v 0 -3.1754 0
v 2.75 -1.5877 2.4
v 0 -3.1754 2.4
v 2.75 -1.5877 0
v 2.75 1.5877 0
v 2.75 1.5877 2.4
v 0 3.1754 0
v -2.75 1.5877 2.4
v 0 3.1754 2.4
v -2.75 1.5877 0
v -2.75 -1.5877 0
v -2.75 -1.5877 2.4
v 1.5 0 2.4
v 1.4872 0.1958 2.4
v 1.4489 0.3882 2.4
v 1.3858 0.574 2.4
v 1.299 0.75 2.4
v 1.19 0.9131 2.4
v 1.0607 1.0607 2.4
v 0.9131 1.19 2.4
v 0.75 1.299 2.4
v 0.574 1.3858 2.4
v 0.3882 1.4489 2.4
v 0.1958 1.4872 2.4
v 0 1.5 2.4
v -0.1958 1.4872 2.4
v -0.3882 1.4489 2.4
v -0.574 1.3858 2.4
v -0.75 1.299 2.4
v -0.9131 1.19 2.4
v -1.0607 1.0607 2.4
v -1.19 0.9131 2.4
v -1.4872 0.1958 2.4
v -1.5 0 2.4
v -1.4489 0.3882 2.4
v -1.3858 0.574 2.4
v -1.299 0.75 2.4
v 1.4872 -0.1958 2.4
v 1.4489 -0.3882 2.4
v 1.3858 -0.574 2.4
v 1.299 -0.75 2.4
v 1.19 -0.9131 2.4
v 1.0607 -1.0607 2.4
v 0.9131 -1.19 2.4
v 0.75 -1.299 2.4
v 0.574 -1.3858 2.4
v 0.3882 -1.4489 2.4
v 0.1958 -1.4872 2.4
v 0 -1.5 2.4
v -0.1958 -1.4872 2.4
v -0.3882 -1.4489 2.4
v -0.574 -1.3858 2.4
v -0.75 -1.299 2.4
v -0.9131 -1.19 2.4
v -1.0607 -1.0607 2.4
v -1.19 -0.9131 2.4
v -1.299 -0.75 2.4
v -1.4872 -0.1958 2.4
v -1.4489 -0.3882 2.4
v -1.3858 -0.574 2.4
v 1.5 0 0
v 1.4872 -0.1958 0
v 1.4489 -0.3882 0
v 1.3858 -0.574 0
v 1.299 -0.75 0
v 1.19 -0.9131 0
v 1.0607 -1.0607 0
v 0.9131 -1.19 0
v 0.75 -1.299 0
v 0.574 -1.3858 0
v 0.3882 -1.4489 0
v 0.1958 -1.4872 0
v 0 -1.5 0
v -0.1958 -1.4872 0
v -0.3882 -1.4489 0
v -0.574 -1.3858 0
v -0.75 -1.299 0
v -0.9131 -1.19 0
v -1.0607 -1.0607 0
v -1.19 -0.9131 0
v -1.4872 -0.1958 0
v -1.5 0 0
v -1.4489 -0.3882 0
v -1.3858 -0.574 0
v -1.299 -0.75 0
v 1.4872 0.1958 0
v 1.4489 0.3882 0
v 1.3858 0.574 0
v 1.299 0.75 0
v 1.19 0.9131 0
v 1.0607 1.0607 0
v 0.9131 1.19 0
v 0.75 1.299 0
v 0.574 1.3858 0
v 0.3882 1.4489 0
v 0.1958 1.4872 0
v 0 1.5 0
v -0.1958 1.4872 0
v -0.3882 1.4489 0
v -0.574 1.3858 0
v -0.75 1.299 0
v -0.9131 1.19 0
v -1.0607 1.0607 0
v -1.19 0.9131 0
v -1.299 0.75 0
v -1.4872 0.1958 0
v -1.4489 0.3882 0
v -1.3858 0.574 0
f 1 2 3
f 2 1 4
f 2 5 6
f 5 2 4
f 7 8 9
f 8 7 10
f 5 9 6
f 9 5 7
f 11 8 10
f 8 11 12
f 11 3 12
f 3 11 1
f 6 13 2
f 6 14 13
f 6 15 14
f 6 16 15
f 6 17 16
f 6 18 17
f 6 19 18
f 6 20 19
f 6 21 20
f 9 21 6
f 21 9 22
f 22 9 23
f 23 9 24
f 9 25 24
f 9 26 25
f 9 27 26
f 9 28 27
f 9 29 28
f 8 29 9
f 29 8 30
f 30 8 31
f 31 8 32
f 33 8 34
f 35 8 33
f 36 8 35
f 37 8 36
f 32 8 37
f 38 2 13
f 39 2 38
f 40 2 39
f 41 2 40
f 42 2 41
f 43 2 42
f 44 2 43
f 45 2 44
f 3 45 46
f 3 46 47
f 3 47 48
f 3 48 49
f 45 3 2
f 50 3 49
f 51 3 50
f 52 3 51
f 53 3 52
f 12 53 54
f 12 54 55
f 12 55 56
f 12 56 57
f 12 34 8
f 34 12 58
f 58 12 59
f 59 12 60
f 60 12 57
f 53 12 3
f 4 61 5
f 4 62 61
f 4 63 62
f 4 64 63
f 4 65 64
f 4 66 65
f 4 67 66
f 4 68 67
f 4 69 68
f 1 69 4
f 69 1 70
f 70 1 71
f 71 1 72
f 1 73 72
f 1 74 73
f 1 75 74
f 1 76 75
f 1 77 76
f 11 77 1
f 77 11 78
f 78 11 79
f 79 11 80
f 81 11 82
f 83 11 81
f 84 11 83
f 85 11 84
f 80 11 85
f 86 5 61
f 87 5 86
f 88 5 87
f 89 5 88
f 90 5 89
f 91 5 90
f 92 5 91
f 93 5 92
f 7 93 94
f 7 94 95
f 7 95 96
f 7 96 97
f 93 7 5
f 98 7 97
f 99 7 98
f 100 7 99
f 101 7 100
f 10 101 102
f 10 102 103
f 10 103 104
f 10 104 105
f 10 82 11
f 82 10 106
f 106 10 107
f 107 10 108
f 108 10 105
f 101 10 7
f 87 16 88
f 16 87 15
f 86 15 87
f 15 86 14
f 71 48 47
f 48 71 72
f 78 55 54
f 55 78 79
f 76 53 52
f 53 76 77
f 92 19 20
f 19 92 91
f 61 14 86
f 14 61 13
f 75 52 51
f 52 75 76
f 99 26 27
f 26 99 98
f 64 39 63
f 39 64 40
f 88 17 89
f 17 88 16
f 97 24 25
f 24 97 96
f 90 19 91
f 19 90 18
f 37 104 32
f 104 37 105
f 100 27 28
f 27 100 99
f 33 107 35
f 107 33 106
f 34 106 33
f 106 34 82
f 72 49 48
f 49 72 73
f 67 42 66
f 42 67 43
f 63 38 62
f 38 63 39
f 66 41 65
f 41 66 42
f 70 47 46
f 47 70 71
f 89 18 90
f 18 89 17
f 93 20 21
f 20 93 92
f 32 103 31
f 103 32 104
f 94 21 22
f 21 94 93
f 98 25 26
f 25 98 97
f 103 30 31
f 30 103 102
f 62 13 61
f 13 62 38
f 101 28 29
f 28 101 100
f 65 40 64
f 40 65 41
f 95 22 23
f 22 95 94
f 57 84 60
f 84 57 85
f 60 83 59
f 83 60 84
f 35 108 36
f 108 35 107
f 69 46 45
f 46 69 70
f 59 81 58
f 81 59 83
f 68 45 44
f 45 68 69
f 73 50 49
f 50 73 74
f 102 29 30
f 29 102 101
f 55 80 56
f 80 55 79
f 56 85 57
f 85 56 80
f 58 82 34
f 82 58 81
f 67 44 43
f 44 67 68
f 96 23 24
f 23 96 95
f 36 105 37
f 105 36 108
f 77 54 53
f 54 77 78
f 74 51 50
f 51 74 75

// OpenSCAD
// A nut of the parts library (packages/contracts/src/parts/nuts.ts), at its greatest size, given as -D overrides. `npm run
// check:assembly` renders it to check the nuts a model holds (e.g. the litter shovel's handle reinforcement). Its bore is drawn
// at the thread's diameter; the screw in it is drawn at its minor diameter (parts/screws/screw.scad).
// Frame: millimetres, as the parts library's preview: standing on z = 0, the axis along Z, H high (a nylon-insert nut's overall
// height), a hexagon with its corners on the Y axis, or a square with its sides along X and Y.

SQUARE = false;
S = 5.5;   // width across flats
H = 2.4;
D = 3;

difference() {
  if (SQUARE) translate([-S / 2, -S / 2, 0]) cube([S, S, H]);
  else rotate([0, 0, 30]) cylinder(r = S / sqrt(3), h = H, $fn = 6);
  translate([0, 0, -1]) cylinder(d = D, h = H + 2, $fn = 48);
}
